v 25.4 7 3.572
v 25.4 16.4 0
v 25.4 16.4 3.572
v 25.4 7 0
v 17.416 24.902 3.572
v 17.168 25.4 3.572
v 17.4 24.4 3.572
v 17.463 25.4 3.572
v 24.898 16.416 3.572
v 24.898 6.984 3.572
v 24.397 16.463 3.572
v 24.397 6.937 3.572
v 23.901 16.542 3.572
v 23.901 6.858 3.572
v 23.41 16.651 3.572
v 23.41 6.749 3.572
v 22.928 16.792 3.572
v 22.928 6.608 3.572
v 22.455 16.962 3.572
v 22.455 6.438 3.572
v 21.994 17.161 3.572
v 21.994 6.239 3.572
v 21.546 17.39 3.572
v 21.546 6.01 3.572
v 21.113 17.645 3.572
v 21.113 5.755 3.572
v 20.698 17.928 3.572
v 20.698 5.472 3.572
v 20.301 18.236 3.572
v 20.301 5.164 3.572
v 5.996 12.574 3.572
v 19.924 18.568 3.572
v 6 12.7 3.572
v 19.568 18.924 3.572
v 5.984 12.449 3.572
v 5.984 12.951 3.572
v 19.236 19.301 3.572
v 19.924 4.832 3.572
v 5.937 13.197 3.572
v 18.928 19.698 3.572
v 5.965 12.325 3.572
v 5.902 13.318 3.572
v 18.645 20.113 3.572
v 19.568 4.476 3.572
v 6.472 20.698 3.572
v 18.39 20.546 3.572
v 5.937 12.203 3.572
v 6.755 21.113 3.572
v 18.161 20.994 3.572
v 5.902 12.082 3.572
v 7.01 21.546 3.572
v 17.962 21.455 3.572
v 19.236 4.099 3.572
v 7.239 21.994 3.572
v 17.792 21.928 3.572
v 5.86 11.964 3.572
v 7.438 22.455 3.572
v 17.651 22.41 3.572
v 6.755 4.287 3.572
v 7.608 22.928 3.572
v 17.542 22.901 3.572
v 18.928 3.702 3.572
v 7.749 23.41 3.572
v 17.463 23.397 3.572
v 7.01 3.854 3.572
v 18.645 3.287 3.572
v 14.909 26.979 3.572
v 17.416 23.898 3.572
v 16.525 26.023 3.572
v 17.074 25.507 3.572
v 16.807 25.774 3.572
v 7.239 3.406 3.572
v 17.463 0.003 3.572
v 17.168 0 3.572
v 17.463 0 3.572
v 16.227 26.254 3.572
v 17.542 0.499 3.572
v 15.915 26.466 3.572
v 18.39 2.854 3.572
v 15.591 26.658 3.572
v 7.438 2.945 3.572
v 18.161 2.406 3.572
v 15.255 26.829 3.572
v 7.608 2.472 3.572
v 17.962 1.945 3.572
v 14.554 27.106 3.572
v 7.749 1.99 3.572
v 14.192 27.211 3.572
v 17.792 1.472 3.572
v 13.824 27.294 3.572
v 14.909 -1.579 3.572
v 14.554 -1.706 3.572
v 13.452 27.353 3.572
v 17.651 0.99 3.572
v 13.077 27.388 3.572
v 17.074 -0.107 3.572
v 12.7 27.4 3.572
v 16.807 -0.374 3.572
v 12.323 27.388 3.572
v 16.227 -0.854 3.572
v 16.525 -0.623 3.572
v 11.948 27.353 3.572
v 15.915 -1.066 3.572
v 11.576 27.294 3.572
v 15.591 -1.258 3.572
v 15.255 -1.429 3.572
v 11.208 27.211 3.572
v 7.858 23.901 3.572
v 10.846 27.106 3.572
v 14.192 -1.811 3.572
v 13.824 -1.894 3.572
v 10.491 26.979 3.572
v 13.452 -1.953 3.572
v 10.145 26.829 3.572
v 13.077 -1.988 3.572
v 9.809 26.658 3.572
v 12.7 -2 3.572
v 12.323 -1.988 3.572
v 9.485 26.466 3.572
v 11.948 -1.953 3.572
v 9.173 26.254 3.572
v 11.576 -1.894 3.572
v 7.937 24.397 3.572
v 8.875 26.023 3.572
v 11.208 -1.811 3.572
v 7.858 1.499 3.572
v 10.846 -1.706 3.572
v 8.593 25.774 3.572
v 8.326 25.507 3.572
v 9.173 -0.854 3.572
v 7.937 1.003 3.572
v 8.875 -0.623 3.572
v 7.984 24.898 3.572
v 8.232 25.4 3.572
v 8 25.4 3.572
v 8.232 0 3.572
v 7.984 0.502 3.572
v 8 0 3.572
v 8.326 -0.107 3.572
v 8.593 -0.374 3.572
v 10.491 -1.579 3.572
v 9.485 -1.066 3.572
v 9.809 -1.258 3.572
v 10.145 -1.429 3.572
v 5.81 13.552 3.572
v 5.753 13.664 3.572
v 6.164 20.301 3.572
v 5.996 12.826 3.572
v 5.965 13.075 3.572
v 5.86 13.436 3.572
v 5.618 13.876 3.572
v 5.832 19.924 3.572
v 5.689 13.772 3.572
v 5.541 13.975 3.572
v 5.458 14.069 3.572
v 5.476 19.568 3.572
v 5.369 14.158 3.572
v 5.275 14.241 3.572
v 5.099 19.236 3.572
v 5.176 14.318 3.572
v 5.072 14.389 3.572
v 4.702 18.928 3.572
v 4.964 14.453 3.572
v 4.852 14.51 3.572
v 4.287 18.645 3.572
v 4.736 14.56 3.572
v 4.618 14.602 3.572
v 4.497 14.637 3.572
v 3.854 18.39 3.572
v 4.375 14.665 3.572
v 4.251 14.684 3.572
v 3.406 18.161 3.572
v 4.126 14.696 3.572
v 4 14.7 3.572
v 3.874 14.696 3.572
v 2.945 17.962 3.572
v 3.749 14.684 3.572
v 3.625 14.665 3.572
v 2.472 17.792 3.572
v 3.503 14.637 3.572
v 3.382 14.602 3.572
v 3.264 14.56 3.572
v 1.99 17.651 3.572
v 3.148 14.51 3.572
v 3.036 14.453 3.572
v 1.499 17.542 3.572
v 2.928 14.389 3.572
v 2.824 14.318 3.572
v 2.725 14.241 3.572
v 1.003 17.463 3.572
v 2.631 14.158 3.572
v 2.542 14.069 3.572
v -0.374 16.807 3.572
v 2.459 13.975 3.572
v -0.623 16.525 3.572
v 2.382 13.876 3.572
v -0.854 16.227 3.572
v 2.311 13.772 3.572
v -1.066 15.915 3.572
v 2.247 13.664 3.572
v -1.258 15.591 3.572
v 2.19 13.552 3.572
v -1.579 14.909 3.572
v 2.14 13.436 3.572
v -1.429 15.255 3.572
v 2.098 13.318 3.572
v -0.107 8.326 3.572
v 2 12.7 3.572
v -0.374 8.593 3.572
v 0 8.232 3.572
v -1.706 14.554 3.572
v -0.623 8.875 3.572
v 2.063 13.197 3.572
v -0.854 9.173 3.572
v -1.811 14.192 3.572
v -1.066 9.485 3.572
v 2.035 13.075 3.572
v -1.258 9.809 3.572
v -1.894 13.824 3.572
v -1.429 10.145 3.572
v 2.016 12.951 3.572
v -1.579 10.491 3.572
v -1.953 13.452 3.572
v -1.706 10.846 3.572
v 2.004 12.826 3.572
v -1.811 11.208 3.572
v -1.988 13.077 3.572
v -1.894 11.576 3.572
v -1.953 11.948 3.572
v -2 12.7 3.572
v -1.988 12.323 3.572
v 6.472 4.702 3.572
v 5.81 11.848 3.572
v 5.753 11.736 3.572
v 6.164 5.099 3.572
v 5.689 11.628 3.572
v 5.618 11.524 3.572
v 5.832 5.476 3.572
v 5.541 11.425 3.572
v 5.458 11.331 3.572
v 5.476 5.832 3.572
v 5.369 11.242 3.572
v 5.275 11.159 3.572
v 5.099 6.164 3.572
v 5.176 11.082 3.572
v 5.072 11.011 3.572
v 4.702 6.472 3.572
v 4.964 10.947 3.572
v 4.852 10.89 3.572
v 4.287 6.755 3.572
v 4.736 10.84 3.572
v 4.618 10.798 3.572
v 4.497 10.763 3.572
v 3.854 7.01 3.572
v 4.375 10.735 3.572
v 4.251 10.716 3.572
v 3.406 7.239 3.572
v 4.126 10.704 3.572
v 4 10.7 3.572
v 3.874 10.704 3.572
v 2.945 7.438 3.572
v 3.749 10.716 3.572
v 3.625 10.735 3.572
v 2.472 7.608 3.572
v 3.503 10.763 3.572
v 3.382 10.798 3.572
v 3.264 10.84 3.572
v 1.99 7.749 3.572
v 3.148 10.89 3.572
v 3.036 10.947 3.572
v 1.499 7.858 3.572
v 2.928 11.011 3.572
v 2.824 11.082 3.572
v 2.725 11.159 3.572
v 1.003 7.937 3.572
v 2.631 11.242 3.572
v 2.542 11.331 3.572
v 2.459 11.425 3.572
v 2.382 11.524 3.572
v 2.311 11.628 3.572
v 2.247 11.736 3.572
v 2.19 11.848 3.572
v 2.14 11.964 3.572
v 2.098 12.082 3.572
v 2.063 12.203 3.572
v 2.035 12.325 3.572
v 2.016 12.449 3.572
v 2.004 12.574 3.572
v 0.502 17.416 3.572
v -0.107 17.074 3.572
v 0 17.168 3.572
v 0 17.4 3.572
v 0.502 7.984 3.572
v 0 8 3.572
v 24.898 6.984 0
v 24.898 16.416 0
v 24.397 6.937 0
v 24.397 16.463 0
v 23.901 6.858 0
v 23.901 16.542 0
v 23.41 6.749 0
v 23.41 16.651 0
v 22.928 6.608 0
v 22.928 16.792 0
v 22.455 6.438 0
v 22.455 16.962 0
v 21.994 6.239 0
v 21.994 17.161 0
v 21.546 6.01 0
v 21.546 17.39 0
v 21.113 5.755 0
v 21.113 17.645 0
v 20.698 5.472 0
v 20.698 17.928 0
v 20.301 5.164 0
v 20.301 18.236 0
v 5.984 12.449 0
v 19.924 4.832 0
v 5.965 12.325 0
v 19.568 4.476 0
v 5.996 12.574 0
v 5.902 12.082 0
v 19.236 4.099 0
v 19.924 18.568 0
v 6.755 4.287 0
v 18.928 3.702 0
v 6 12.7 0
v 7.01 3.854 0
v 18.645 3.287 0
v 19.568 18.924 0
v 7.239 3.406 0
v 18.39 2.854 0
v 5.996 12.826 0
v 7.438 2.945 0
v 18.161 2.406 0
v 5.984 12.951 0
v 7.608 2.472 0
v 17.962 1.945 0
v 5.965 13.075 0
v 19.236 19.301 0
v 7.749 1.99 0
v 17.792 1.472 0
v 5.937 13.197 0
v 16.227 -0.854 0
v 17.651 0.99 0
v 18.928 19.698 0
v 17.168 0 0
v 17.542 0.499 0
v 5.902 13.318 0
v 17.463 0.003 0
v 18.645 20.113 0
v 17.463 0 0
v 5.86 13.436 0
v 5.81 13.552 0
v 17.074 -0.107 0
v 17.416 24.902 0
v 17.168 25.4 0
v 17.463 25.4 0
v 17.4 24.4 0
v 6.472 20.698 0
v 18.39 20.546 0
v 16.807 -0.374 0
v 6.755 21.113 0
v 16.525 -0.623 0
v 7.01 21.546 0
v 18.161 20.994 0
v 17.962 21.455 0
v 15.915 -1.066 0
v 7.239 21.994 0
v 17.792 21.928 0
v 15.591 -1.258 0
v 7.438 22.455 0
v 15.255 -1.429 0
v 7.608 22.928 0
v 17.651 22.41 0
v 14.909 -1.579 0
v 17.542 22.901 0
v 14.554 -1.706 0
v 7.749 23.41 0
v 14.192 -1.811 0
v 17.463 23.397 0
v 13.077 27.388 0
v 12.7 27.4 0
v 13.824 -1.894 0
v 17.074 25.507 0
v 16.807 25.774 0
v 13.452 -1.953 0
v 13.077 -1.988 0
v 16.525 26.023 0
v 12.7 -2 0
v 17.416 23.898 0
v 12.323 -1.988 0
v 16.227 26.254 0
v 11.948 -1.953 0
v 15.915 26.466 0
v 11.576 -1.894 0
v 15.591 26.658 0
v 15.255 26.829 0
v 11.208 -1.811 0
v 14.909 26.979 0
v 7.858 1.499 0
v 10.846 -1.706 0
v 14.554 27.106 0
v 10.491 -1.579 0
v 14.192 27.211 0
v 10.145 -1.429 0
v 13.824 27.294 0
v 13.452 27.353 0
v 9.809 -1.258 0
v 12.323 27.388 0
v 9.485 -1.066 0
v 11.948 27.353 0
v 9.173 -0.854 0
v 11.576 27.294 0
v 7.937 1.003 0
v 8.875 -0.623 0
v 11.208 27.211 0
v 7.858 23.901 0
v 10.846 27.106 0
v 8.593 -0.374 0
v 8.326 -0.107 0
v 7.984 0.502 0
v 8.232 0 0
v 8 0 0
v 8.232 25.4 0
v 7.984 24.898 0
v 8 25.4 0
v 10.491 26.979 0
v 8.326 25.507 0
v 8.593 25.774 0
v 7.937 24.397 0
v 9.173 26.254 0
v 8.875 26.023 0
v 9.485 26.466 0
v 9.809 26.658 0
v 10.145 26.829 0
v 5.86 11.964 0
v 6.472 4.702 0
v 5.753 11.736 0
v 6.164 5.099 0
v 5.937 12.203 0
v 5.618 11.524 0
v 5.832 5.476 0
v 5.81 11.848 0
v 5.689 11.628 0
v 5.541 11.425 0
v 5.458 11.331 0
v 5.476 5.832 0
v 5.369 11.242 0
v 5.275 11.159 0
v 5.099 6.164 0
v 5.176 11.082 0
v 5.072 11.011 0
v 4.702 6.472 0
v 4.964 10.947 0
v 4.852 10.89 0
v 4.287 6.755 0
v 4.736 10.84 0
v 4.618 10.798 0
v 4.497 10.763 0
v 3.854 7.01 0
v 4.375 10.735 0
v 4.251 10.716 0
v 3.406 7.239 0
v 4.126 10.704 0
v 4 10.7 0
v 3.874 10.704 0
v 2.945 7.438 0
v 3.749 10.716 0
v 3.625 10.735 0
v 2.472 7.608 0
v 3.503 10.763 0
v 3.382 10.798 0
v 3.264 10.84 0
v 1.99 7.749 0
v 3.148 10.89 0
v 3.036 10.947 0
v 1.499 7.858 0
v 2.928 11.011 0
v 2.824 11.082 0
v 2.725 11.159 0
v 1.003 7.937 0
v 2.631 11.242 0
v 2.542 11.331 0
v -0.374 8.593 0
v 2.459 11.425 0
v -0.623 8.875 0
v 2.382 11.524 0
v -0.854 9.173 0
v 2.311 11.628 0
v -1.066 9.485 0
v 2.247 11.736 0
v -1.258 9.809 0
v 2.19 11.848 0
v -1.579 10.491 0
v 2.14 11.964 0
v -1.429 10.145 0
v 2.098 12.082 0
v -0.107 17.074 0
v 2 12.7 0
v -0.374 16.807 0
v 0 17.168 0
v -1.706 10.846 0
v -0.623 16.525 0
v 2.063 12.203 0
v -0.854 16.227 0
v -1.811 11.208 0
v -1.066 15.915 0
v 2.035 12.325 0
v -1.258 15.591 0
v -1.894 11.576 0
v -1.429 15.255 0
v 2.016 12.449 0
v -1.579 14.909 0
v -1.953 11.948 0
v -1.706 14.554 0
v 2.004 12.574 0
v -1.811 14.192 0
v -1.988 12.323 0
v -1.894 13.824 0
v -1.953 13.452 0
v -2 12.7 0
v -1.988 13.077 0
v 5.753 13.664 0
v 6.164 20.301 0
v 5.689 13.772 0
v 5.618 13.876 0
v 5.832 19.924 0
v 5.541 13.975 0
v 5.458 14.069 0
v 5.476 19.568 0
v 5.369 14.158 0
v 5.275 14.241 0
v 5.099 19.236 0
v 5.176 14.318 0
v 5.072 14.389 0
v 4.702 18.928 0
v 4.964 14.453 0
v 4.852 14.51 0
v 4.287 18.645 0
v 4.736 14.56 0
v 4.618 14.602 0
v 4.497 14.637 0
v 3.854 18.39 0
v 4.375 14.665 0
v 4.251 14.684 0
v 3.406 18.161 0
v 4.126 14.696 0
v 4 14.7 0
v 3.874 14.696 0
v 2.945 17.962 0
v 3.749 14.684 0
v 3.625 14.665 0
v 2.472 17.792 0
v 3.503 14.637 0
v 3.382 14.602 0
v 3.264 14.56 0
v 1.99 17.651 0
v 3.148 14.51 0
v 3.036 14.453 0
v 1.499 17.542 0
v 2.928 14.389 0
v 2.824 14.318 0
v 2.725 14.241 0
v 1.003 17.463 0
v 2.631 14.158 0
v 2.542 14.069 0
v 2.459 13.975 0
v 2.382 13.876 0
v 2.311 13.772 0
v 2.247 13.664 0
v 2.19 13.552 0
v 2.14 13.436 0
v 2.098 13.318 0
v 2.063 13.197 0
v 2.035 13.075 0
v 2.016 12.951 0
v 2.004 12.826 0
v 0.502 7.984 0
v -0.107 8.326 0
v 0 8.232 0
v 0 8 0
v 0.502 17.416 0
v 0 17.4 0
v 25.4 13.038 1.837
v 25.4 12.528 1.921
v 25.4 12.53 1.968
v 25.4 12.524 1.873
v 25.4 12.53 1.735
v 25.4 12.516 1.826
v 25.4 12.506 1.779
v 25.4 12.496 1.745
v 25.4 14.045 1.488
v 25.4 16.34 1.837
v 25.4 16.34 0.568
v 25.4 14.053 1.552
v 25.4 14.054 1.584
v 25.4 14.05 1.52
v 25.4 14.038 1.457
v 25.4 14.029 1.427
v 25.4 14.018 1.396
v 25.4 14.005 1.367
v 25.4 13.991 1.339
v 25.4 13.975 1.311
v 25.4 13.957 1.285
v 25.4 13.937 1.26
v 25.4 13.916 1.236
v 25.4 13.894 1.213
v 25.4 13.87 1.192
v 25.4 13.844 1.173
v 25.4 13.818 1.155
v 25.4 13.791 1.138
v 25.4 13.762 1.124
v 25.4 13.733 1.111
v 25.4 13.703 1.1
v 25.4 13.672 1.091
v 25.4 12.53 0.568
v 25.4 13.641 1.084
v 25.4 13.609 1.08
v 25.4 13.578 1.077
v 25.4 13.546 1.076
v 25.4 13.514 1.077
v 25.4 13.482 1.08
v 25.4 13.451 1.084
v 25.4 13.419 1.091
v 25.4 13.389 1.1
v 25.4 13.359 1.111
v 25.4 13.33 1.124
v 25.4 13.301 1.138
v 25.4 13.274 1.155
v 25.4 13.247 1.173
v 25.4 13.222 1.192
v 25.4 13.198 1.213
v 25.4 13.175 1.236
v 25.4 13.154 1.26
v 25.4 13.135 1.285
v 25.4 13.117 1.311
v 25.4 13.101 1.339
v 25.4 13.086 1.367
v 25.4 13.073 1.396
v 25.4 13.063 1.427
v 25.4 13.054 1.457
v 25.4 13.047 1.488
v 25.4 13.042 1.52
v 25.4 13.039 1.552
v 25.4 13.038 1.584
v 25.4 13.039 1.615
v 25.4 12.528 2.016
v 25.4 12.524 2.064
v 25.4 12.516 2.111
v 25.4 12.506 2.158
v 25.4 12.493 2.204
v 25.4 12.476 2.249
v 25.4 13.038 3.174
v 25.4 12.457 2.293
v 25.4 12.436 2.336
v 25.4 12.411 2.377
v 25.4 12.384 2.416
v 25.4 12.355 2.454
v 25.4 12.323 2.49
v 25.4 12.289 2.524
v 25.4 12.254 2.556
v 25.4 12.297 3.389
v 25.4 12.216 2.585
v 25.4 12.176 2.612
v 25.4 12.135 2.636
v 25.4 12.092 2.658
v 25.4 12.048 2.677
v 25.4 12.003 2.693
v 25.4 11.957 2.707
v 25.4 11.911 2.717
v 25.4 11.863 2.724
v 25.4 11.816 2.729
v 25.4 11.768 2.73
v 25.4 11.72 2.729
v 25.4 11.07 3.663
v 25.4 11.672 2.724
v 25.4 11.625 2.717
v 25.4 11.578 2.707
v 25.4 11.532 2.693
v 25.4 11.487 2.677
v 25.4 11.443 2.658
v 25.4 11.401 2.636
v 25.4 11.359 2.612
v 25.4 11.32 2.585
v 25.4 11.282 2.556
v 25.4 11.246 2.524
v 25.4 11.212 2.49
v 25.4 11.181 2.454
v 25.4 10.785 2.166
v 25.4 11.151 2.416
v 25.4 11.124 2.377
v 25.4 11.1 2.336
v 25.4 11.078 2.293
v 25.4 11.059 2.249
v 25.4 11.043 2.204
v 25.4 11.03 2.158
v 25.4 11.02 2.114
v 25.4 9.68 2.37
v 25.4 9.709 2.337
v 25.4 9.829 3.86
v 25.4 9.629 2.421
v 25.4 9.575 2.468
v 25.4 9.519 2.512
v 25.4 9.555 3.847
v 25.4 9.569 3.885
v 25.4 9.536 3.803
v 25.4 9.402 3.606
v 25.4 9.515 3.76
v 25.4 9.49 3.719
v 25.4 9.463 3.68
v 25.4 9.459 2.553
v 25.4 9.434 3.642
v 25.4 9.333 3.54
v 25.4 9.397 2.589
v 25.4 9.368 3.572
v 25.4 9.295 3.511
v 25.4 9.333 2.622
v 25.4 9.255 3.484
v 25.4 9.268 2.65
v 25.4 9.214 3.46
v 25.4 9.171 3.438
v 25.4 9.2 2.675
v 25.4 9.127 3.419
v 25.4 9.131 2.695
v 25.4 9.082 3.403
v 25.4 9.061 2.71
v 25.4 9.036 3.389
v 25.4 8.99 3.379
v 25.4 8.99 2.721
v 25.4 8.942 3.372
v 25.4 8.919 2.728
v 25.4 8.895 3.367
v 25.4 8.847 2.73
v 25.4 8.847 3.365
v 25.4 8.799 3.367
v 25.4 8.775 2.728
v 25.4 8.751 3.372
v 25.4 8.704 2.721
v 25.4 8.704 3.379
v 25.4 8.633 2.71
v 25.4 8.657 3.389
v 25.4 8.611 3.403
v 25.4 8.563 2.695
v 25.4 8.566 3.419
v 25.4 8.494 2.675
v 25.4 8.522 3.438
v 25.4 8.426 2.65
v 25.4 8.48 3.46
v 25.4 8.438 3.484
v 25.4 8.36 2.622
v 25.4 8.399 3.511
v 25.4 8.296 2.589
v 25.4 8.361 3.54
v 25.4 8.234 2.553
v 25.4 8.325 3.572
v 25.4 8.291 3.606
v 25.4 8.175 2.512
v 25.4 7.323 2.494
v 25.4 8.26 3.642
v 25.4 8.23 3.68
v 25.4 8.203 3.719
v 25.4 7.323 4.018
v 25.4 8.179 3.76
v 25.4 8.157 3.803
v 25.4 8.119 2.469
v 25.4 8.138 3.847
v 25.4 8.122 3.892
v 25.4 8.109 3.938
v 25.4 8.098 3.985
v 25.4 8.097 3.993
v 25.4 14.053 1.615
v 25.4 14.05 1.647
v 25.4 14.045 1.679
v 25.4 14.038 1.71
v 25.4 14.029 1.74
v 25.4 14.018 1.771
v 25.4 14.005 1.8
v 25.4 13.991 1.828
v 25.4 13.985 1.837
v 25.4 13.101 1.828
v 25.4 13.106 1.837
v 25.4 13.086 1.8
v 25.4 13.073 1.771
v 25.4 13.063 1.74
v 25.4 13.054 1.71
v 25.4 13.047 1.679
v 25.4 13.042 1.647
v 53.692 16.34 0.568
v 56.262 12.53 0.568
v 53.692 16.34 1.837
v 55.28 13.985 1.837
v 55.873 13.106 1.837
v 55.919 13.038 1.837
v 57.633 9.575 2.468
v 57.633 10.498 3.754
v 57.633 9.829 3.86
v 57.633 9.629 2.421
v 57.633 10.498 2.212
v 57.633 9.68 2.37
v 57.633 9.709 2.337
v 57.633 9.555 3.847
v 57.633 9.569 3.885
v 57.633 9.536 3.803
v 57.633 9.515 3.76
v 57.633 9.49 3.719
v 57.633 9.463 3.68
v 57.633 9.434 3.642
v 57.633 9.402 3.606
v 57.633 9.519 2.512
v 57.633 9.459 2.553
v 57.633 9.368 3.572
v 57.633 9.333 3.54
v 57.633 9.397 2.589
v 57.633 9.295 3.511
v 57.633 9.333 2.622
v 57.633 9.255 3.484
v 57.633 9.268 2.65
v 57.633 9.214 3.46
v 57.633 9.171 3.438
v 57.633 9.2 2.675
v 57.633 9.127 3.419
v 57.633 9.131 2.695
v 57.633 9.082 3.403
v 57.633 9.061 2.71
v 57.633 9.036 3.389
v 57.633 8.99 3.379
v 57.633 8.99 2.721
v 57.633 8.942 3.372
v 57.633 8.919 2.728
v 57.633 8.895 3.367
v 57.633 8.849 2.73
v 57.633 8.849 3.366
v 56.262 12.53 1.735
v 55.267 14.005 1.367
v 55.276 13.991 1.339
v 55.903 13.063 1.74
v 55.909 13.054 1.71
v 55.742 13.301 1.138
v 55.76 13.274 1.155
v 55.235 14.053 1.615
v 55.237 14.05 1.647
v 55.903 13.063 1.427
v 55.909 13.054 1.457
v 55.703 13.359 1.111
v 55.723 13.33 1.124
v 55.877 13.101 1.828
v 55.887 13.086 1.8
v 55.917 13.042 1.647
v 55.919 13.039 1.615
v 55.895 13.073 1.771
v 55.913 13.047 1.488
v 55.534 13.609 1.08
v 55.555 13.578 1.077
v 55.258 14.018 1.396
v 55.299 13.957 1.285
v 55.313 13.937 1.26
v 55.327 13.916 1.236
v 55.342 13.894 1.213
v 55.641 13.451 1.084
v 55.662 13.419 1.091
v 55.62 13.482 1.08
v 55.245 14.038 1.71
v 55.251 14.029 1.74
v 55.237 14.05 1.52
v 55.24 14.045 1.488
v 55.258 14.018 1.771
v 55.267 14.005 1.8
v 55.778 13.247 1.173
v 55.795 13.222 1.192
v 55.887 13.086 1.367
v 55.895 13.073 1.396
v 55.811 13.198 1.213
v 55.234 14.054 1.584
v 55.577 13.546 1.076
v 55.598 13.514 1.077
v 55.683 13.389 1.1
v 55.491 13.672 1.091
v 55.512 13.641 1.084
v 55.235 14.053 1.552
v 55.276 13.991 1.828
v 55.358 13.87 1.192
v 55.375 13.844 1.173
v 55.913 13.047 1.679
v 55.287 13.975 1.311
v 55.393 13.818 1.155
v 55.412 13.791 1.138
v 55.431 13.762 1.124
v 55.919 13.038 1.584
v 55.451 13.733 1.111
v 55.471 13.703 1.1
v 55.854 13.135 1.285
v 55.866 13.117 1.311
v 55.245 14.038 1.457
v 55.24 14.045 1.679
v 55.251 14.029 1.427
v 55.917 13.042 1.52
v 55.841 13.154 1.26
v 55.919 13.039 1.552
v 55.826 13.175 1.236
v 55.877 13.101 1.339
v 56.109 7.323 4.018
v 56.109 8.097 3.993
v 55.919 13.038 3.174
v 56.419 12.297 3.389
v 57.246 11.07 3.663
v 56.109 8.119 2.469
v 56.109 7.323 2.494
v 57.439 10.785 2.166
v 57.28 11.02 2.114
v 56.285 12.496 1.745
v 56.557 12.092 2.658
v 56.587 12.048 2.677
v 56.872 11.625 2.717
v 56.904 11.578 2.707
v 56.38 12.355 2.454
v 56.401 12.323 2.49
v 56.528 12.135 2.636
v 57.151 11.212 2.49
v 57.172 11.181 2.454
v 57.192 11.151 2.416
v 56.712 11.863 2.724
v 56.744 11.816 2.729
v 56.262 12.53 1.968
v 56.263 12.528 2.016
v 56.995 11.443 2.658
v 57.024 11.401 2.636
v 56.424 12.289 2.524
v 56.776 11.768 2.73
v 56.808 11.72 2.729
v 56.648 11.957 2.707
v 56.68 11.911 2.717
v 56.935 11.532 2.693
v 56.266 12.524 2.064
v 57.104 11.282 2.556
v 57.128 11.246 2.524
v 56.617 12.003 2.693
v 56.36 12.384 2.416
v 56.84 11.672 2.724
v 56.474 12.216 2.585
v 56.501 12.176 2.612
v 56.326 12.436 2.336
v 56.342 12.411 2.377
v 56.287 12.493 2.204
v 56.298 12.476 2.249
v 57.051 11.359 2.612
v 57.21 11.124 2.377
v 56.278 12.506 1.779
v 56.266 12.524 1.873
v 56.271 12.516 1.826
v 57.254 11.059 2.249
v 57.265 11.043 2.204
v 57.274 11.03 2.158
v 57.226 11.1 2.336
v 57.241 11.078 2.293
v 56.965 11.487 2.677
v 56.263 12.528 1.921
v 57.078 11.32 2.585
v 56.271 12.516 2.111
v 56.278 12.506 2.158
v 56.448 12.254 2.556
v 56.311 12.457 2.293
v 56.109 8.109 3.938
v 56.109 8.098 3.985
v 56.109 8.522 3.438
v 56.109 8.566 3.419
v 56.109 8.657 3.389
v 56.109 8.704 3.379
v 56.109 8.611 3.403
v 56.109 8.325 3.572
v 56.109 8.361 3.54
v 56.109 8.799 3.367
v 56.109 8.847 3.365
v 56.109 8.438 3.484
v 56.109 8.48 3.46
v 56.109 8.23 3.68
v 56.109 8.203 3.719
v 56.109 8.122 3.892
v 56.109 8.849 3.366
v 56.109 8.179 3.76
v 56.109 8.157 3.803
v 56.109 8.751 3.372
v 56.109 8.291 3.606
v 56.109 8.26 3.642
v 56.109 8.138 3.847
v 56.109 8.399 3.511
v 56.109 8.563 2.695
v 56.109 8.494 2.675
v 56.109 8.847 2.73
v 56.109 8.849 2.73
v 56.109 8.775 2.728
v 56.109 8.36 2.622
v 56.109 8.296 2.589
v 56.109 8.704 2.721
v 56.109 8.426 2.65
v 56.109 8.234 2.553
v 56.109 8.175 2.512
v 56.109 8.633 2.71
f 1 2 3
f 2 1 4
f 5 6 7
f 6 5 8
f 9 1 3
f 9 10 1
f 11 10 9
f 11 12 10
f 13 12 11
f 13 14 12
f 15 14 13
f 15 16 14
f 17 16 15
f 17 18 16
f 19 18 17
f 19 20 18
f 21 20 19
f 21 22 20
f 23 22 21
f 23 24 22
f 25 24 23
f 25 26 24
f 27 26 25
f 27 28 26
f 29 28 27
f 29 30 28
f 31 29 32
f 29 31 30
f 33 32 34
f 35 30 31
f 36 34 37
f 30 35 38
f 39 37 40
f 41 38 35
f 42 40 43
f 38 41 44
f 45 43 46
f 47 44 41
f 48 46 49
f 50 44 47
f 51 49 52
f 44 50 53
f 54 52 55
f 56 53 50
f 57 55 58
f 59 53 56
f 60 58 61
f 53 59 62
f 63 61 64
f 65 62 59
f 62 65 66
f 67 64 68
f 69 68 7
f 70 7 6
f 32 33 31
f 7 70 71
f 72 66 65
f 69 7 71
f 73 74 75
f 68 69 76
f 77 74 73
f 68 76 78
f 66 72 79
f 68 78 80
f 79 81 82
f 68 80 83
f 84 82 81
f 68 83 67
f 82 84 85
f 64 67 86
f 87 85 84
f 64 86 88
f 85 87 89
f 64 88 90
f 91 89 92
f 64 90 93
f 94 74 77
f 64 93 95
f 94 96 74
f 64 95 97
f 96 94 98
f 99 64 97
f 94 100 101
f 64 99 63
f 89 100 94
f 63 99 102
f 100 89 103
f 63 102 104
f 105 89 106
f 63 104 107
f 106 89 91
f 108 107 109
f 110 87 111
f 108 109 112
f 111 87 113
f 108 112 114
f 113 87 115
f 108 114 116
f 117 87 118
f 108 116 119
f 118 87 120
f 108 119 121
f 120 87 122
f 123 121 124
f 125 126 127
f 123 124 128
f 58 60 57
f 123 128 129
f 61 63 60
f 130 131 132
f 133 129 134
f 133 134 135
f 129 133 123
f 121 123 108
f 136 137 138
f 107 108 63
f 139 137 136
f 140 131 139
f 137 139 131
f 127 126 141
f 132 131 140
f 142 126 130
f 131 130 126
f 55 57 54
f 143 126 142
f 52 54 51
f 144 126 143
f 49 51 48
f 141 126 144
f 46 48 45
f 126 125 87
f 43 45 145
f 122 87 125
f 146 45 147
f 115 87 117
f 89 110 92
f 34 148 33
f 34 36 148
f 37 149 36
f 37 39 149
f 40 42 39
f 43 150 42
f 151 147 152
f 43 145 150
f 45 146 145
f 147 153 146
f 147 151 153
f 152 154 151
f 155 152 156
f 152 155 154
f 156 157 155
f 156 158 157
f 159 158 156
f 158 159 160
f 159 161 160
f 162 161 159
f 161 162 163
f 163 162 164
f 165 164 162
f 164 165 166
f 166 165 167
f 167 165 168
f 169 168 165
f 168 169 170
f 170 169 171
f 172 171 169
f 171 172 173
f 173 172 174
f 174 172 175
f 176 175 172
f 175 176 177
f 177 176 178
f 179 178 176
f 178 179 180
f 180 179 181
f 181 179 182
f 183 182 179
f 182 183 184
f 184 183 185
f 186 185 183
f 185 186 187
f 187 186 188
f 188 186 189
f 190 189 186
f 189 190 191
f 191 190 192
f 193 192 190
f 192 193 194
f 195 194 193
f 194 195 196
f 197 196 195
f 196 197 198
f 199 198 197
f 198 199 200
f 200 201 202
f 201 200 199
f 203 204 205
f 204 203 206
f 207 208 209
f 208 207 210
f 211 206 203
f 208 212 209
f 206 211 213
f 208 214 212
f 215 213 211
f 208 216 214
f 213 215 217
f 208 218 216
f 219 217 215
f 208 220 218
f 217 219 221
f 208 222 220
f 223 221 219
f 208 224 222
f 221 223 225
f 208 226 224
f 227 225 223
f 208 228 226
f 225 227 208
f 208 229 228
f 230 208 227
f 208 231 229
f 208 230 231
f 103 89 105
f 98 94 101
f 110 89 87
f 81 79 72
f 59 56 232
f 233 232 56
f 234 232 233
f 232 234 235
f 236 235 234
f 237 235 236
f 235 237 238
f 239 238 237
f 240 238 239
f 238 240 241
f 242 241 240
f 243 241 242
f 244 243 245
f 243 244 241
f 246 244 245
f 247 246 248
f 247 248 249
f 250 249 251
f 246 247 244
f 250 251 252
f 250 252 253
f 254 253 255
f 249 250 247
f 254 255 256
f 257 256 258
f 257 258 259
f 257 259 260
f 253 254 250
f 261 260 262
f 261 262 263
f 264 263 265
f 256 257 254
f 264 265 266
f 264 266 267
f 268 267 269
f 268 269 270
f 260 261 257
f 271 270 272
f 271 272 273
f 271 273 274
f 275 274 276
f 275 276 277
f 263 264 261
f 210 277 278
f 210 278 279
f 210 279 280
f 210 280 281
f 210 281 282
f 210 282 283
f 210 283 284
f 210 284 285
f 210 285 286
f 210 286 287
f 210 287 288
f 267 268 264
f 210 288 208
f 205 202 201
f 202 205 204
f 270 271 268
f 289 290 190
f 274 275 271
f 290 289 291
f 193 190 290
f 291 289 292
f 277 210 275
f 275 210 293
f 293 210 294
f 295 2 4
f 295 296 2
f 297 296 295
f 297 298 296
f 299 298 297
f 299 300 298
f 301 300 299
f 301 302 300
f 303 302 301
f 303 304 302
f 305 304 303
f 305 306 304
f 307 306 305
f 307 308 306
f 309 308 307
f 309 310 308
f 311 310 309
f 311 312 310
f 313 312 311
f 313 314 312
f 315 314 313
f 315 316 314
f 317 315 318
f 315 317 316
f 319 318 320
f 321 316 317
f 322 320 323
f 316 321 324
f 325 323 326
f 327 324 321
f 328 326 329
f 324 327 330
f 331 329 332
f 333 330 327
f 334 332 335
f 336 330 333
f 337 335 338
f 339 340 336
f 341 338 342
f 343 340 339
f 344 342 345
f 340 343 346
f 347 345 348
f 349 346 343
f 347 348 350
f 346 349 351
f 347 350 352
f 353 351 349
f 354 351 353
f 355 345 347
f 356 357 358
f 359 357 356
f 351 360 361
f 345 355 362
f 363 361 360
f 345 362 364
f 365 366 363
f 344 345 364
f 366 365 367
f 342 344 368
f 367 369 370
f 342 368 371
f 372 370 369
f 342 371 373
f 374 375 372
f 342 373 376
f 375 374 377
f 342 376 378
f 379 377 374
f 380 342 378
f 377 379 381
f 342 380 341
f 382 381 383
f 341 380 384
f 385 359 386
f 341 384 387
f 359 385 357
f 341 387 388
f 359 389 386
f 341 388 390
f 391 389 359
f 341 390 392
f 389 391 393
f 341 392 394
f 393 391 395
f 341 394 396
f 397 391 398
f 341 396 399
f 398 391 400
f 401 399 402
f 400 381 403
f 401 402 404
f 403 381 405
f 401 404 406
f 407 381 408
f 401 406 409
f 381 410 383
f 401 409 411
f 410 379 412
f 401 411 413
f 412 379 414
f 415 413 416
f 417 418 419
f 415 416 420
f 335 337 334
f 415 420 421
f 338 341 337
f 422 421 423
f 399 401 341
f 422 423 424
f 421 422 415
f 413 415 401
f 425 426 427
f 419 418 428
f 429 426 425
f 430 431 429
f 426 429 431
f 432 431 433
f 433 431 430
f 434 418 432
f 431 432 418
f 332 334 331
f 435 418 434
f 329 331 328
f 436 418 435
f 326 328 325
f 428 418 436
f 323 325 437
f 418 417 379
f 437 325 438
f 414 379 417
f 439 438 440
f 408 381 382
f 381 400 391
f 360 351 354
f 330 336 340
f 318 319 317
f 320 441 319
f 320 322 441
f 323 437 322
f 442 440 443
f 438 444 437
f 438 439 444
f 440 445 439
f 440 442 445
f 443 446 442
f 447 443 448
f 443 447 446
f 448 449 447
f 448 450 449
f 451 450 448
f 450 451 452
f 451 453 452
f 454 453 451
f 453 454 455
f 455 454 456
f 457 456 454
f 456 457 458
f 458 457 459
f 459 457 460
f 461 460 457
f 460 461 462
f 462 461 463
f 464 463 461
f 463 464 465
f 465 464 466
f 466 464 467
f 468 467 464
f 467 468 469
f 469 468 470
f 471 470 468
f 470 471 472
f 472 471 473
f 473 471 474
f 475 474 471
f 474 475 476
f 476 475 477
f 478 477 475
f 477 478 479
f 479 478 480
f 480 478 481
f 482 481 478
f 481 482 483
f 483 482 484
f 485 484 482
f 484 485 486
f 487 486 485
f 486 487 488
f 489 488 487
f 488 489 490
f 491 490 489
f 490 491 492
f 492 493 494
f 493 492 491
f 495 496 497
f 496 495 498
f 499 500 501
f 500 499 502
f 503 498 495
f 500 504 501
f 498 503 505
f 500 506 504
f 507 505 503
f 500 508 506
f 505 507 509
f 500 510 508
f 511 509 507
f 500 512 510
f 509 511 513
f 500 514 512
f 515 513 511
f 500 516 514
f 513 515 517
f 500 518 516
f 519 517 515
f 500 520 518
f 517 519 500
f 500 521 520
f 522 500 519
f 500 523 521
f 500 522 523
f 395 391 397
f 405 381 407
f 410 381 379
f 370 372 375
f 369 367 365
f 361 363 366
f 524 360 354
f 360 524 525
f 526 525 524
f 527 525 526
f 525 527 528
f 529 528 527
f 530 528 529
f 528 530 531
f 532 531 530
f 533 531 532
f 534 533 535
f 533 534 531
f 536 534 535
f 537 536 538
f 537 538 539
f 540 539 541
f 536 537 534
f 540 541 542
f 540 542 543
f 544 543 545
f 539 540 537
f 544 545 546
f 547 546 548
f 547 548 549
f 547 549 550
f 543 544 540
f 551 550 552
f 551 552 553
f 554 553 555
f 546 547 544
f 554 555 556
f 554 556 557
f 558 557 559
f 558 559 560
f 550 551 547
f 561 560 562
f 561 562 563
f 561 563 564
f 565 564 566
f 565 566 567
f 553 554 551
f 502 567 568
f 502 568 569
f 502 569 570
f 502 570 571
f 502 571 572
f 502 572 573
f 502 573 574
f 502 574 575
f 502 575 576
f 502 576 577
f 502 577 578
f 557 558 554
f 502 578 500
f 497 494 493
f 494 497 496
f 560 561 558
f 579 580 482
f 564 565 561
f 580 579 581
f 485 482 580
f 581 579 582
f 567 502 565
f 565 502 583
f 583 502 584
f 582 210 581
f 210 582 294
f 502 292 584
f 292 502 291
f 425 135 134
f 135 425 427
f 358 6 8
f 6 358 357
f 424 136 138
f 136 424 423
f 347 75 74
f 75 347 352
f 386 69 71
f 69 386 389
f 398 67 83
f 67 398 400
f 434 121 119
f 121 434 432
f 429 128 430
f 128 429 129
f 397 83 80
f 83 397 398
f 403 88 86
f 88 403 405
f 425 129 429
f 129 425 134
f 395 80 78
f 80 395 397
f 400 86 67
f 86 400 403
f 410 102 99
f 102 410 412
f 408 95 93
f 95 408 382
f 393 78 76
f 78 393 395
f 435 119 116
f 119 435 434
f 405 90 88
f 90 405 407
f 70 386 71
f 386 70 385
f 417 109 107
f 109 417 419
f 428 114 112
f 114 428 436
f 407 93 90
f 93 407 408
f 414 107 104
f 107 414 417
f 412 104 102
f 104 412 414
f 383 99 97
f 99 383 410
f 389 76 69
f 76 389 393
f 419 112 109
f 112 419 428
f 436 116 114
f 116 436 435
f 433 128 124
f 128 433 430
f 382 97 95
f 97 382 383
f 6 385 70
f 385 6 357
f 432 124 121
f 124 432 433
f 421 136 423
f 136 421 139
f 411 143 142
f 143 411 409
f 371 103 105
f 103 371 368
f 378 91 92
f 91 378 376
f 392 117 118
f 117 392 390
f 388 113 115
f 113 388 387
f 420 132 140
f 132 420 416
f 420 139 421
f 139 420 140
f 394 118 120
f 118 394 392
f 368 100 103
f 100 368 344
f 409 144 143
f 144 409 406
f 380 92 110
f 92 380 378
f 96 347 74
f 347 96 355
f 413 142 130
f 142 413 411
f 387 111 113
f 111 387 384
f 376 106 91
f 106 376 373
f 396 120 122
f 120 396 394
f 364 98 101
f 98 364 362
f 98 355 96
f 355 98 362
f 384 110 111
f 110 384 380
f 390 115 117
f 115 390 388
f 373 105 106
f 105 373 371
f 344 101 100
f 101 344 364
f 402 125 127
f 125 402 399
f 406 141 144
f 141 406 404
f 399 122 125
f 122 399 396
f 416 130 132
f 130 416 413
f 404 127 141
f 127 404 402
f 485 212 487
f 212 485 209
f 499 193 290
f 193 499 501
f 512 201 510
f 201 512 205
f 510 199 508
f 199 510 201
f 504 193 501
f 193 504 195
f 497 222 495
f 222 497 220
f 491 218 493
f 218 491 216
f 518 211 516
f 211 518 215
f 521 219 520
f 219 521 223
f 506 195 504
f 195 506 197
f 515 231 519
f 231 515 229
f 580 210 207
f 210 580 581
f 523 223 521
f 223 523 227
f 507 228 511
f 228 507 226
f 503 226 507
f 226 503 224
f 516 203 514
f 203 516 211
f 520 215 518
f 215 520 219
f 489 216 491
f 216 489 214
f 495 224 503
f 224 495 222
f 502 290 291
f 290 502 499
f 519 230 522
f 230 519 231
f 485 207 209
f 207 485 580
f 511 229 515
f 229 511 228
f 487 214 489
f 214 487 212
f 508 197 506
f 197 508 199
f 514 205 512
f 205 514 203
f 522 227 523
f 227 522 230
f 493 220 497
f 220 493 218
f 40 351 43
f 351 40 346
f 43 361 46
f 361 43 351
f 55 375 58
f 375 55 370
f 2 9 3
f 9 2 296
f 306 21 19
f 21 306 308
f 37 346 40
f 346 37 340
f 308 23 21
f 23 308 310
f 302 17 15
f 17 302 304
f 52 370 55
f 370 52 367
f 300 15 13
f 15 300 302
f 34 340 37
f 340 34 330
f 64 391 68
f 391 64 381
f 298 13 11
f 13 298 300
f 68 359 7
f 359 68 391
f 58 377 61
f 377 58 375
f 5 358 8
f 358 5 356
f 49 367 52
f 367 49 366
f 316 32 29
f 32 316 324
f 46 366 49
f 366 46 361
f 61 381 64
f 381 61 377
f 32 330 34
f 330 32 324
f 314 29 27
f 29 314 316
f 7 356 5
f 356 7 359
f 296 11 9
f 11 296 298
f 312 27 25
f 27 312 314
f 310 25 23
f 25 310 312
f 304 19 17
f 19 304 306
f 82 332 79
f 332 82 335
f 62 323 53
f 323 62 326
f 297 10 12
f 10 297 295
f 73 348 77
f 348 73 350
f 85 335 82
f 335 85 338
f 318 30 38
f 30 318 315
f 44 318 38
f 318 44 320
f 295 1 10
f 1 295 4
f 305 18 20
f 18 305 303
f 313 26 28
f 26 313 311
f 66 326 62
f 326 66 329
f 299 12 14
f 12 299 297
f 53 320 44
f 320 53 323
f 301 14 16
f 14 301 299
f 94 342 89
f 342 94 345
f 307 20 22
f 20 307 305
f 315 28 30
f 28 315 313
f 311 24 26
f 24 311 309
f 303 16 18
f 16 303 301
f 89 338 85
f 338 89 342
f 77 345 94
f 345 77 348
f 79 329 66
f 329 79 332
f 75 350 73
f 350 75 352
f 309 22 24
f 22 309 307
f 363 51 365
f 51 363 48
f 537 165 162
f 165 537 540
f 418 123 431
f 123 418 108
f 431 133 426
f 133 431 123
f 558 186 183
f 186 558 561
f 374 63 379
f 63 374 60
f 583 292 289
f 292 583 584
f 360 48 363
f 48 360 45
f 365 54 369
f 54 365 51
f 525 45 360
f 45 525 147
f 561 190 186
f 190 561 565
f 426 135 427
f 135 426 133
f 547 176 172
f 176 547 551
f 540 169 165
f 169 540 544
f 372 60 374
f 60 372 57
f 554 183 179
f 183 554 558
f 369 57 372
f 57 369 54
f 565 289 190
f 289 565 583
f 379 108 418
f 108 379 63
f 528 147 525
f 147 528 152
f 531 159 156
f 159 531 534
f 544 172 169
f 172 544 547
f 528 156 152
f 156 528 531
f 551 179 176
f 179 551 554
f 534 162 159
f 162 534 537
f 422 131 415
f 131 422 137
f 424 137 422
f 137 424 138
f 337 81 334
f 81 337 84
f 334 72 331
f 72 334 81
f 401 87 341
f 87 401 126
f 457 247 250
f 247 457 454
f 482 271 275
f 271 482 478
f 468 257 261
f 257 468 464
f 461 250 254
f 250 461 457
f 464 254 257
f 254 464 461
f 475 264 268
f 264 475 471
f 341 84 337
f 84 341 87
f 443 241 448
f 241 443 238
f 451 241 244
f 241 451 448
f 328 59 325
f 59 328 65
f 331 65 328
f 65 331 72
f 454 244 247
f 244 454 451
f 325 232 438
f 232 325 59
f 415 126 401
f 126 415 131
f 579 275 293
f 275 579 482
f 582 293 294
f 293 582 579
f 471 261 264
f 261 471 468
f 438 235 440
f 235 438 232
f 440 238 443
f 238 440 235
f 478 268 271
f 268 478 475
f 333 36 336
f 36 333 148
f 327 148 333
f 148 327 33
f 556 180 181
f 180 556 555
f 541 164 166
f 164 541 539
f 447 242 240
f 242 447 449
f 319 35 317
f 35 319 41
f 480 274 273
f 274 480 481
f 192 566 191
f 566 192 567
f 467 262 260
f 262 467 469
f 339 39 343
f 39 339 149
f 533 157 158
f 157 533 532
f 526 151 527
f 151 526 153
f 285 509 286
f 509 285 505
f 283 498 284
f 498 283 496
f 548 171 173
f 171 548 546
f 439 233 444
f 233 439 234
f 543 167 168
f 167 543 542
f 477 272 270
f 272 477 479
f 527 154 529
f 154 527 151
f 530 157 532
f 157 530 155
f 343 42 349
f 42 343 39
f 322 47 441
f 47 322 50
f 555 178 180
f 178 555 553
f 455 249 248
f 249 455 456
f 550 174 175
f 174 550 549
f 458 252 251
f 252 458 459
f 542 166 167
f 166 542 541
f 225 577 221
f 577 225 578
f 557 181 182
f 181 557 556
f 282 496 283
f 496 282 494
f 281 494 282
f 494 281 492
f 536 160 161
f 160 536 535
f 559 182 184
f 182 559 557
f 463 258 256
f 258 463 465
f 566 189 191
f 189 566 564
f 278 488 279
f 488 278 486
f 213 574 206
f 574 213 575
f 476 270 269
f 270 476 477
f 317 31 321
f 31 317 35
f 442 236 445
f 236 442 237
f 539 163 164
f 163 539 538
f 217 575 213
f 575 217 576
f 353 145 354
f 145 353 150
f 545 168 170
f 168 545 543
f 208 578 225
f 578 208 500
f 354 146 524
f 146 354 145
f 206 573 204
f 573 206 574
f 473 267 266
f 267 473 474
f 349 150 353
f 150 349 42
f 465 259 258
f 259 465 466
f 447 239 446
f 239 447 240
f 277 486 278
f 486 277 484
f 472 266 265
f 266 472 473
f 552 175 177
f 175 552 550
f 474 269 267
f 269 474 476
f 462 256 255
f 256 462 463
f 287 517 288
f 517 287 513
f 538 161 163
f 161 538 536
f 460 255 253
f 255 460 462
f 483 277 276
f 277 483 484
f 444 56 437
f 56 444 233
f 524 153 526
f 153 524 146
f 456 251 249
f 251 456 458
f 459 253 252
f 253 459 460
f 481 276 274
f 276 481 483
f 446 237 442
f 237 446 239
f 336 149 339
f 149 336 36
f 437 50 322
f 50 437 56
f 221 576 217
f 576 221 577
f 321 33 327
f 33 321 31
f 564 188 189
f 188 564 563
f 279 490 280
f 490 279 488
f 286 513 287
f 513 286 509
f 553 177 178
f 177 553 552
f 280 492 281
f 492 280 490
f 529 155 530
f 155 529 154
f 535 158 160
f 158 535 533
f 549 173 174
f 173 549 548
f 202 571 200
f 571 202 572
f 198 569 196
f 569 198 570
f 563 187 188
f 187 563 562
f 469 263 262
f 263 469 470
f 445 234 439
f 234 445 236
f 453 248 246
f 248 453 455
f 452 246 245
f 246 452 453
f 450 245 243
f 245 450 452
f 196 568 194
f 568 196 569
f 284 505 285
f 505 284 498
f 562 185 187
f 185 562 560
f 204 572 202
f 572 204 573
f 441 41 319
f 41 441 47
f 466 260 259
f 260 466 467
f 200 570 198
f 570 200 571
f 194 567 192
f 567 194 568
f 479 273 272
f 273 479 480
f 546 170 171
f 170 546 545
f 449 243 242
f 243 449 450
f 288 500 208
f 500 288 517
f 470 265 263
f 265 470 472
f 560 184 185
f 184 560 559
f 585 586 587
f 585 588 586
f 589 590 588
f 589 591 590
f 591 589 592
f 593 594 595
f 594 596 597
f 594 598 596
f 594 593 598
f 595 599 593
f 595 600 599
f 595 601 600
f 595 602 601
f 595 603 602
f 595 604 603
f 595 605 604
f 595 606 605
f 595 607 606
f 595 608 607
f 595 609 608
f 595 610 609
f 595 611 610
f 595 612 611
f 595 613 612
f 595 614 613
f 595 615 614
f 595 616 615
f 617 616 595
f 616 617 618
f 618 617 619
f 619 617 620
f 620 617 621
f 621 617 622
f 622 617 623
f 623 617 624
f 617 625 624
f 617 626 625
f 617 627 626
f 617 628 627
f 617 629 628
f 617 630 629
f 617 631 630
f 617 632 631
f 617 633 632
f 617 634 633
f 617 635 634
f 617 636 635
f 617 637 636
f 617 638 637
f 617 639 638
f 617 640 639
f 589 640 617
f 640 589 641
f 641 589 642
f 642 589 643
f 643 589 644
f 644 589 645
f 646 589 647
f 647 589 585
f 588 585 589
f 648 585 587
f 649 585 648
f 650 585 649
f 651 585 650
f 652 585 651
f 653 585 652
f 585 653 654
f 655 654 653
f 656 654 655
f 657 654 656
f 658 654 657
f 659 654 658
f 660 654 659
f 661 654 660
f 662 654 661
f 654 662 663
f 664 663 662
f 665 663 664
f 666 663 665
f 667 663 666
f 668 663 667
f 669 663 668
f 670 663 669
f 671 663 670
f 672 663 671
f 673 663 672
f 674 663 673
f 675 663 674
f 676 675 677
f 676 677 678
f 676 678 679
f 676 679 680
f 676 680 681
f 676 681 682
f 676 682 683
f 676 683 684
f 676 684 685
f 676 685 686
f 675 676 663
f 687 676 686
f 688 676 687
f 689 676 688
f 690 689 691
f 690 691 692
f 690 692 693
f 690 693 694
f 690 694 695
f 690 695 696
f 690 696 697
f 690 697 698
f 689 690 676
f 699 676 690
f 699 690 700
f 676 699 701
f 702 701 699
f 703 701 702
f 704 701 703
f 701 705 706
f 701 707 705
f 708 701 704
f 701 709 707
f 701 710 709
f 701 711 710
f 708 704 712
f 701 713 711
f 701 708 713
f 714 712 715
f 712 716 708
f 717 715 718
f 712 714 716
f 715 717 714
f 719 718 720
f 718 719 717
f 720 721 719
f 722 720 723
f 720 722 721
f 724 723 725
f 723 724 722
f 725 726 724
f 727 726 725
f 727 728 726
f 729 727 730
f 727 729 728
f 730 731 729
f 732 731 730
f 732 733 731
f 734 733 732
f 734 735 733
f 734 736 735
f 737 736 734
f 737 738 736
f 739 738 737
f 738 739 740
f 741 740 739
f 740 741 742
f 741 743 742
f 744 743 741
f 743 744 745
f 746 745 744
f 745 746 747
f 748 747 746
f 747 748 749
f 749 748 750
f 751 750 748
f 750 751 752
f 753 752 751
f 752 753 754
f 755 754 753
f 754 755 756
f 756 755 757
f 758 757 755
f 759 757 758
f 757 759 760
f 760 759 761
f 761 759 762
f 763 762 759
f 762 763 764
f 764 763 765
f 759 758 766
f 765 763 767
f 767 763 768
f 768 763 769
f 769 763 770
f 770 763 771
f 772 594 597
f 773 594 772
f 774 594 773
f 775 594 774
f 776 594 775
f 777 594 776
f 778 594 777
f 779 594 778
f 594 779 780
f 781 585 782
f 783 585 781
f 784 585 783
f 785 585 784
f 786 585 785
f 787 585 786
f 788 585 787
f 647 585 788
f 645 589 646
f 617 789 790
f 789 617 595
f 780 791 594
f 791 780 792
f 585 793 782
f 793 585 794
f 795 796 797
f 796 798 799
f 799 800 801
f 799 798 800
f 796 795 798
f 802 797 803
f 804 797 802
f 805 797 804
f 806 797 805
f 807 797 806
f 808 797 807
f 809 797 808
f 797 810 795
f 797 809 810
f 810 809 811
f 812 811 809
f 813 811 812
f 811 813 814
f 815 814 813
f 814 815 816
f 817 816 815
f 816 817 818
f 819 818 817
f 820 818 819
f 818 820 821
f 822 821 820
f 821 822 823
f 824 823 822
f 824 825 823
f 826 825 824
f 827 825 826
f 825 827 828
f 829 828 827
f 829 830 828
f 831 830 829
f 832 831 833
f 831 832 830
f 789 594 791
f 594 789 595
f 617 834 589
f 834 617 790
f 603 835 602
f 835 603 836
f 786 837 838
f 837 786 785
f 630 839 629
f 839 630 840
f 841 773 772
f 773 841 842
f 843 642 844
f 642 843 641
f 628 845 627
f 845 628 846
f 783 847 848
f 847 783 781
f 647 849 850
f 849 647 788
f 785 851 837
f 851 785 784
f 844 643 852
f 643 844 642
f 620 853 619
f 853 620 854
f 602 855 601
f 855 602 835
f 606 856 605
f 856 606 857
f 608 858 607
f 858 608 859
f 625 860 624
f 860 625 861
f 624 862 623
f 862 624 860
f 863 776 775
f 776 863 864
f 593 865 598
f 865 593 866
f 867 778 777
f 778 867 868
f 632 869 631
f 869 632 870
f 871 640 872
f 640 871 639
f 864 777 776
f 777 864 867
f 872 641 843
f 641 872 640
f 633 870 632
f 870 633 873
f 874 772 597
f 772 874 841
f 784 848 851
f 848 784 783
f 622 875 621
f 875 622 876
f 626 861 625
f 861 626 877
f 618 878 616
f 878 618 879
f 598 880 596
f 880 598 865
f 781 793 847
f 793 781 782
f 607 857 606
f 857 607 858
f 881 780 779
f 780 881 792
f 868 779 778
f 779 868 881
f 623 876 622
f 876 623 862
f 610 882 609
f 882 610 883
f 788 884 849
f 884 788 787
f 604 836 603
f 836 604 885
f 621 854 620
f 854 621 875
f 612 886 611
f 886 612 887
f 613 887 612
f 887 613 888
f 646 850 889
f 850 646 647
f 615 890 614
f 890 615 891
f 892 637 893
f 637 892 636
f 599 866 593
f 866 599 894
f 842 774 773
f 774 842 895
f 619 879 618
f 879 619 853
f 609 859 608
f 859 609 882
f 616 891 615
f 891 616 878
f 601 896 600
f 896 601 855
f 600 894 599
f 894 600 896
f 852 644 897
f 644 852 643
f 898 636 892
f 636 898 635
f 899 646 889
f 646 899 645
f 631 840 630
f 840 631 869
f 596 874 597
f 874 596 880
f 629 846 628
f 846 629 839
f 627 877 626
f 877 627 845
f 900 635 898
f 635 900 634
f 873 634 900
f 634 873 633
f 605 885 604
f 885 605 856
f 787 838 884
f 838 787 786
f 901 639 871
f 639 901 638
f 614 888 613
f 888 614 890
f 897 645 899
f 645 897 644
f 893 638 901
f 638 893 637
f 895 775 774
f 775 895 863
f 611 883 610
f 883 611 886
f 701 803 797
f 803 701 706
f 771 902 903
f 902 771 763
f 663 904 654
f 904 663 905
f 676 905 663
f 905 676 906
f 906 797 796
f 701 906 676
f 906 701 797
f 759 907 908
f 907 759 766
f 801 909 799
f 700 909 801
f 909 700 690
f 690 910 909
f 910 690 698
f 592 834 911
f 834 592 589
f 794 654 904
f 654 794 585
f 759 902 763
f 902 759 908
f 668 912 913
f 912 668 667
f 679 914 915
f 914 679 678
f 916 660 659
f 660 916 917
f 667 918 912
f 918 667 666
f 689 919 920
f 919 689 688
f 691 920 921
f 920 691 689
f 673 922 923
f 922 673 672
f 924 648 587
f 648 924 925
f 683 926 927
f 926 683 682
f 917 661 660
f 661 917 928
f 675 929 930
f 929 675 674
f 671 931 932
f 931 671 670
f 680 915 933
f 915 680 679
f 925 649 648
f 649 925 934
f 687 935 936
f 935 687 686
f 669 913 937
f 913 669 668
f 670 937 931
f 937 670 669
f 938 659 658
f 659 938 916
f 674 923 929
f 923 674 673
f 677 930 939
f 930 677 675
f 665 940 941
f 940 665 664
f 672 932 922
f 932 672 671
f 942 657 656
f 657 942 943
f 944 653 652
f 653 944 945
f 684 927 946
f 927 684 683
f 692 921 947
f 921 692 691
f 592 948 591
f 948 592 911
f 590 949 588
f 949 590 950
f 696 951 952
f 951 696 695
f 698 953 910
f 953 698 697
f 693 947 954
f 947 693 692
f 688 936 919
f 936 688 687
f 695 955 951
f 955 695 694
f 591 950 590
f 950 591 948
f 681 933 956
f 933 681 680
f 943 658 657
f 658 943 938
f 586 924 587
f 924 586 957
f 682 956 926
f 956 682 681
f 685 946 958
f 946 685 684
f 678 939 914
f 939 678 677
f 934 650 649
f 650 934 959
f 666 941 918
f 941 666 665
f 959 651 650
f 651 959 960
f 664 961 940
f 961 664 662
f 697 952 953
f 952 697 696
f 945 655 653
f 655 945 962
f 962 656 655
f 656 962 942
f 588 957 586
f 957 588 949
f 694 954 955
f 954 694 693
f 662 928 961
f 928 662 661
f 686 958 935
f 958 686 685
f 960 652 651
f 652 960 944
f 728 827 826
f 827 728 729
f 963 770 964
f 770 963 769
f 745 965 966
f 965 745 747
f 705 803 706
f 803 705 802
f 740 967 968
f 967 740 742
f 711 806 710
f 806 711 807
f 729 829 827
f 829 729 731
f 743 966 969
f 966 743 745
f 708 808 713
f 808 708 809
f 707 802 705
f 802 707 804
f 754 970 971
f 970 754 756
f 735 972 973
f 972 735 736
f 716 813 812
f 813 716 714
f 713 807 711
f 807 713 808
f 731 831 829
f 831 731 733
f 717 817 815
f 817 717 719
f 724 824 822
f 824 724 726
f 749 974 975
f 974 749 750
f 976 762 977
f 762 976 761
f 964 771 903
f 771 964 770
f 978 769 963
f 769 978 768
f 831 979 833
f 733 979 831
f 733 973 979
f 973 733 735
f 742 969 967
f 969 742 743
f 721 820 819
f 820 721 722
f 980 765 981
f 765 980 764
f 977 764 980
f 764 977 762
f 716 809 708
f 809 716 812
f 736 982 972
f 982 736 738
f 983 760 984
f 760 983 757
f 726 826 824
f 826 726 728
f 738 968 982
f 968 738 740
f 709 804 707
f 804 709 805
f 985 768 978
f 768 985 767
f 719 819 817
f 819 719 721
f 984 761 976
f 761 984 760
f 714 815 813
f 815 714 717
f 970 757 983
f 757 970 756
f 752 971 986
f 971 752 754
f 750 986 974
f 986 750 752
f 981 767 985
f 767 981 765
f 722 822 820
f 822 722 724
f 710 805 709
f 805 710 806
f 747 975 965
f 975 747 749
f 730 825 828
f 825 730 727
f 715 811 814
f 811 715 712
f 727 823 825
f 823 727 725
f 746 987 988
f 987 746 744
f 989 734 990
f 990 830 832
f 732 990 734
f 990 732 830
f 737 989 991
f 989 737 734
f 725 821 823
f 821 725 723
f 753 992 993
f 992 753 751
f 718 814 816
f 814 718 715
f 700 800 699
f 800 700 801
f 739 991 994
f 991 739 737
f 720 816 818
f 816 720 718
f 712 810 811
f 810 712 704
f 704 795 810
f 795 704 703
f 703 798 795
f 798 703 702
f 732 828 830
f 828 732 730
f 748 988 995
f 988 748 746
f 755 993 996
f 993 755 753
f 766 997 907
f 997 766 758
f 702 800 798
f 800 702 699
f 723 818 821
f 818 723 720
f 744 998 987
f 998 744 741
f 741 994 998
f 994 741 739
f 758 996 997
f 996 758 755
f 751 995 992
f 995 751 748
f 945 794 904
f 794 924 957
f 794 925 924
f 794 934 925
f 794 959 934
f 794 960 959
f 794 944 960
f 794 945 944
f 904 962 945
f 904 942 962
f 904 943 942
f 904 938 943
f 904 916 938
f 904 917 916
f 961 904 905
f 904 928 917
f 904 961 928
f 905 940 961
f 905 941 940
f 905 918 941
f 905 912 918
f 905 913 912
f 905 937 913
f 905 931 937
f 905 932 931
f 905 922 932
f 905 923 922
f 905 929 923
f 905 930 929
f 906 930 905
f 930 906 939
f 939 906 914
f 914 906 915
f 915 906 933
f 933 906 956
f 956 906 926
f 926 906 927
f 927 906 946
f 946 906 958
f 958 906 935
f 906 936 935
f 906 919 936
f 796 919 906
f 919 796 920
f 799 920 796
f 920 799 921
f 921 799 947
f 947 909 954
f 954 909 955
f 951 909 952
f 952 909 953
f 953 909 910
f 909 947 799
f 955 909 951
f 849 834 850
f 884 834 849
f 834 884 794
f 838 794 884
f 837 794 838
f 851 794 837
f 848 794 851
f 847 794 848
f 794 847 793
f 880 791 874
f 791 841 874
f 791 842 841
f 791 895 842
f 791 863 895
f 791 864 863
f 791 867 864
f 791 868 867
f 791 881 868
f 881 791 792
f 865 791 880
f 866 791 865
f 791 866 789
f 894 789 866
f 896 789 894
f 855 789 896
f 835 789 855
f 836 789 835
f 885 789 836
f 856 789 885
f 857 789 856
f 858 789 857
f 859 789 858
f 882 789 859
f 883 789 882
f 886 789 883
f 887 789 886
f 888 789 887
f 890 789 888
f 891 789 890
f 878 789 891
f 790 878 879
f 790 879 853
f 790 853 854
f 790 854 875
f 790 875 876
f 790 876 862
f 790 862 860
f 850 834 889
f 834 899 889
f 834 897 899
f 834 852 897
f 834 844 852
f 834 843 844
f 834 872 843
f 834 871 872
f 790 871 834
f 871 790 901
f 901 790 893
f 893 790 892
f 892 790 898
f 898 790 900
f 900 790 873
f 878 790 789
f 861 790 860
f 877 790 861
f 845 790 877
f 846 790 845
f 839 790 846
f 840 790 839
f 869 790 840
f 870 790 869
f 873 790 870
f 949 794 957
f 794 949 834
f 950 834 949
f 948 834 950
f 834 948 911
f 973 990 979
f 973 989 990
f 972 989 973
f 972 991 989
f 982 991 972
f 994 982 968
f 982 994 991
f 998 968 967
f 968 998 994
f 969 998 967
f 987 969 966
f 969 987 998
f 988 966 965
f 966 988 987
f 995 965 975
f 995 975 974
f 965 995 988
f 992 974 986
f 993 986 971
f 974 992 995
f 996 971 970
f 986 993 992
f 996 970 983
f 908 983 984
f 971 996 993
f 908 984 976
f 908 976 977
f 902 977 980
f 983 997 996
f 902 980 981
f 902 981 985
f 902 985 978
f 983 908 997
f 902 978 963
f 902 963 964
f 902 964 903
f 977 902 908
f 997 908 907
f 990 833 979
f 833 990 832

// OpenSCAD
//BEST G - Model

$fn=100;

function mm(i) = i*25.4;

module bow(bow_length, bow_width, bow_thickness)
{
	difference()
	{
		union()
		{
			cube([bow_length, bow_width, bow_thickness]);

			//Place cylinders on the top and bottom of the bow for style

			//Top middle
			translate([bow_length / 2, bow_width - 4, 0]) cylinder(h = bow_thickness, r = 6);

			//Bottom middle
			translate([bow_length / 2, 4, 0]) cylinder(h = bow_thickness, r = 6);

			//Left
			translate([4, bow_width / 2, 0]) cylinder(h = bow_thickness, r = 6);
		}

		//Place cylinders around the edges to create a more contoured design

		//Right top
		translate([bow_length, bow_width - 1, 0]) cylinder(h = bow_thickness, r = 8);

		//Right bottom
		//Positioned -1 from the axis to create a bow stop
		translate([bow_length, -1 , 0]) cylinder(h = bow_thickness, r = 8);
		
		//Left top
		translate([0, bow_width, 0]) cylinder(h = bow_thickness, r = 8);
	
		//Left bottom
		translate([0, 0, 0]) cylinder(h = bow_thickness, r = 8);

		//Place hole for keychain use
		translate([4, bow_width / 2, 0]) cylinder(h = bow_thickness, r = 2);
	}
}

module bit()
{
	w = mm(1/4);
	difference() 
	{
		translate([-w/2, 0, 0]) cube([w, mm(1), w]);
		translate([-mm(7/256), 0, 0]) rotate([0, 0, 135]) cube([w, w, w]);
		translate([mm(7/256), 0, 0]) rotate([0, 0, -45]) cube([w, w, w]);
}
}

module security_leg(blade_length, radius, security_leg_thickness, security_leg_width, shift)
{
	translate([-shift, 0, 0]) difference()
	{
		cylinder(h = blade_length, r = radius);
		cylinder(h = blade_length, r = (radius - security_leg_thickness));
		translate([0, security_leg_width, 0]) cube([radius, radius - security_leg_width, blade_length]);
		translate([0, -radius, 0]) cube([radius, radius, blade_length]);
		translate([-radius, -radius, 0]) cube([radius, 2 * radius, blade_length]);
	}; 
}
module blade(blade_length, blade_width, blade_thickness, key_cuts, shoulder, cut_spacing, cut_depth)
{
	biting_blade_width = mm(.150);
	biting_blade_thickness = mm(.05);
	security_leg_thickness = mm(.06);
	security_leg_width = mm(.225);
	radius = 20;
	shift = sqrt((radius-security_leg_thickness)*(radius-security_leg_thickness) - security_leg_width*security_leg_width);
	difference()
	{

		translate([blade_length, 0, 0]) rotate([0, 180, 0])
		{
			difference()
			{
				union()
				{
					translate([0, mm(.225) - mm(.02), -.25]) difference()
					{
						cube([blade_length, biting_blade_width, biting_blade_thickness]);
						translate([-mm(.075), mm(.04), mm(.01)]) rotate([0, 90, 0]) cylinder(h = blade_length + mm(.1), r = mm(.02));
					}
					rotate([0, 90, 0]) security_leg(blade_length, radius, security_leg_thickness, security_leg_width, shift);
				};

				//Cut security leg channels
				translate([0, security_leg_width - (mm(.05)), -mm(.015)]) rotate([0, 90, 0]) cylinder(h = blade_length + mm(.1), r = mm(.03));
				translate([0, mm(.06), -mm(.1)]) rotate([0, 90, 0]) cylinder(h = blade_length + mm(.1), r = mm(.03));
				translate([0, mm(.06), 0]) rotate([0, 90, 0]) cylinder(h = blade_length + mm(.1), r = mm(.045));
			};
		};
		//Contour tip		 
		translate([blade_length, mm(1/8), -20]) {
			rotate([0, 0, 34]) cube([10, 10, 40]);
		}

		//Tip stop
		translate([blade_length - mm(.06), 0, 0]) {
			cube([mm(.09877), mm(.0601), blade_thickness]);
		}

		//Cut the blade
		for (counter = [0:6]) 
		{
			*translate([shoulder + (counter * cut_spacing) + .5, blade_width - (key_cuts[counter]) * cut_depth - .5, 0]) bit();
		}
	}
}

module keymark(key_cuts) 
{
	blade_length = mm(1.269);
	blade_width = mm(.318);
	blade_thickness = mm(0.110);

	shoulder = mm(0.2);
	cut_spacing = mm(.15);
	cut_depth = mm(.0125);
    
	bow_length = mm(1);
	bow_width = mm(1);
	bow_thickness = mm(4.5/32);

	union()
	{
		bow(bow_length, bow_width, bow_thickness); 
		translate([bow_length, bow_width - blade_width - 10, mm(1/16)]) blade(blade_length, blade_width, blade_thickness, key_cuts, shoulder, cut_spacing, cut_depth);
	}
}

keymark([0, 0, 0, 0, 0, 0, 0]);
